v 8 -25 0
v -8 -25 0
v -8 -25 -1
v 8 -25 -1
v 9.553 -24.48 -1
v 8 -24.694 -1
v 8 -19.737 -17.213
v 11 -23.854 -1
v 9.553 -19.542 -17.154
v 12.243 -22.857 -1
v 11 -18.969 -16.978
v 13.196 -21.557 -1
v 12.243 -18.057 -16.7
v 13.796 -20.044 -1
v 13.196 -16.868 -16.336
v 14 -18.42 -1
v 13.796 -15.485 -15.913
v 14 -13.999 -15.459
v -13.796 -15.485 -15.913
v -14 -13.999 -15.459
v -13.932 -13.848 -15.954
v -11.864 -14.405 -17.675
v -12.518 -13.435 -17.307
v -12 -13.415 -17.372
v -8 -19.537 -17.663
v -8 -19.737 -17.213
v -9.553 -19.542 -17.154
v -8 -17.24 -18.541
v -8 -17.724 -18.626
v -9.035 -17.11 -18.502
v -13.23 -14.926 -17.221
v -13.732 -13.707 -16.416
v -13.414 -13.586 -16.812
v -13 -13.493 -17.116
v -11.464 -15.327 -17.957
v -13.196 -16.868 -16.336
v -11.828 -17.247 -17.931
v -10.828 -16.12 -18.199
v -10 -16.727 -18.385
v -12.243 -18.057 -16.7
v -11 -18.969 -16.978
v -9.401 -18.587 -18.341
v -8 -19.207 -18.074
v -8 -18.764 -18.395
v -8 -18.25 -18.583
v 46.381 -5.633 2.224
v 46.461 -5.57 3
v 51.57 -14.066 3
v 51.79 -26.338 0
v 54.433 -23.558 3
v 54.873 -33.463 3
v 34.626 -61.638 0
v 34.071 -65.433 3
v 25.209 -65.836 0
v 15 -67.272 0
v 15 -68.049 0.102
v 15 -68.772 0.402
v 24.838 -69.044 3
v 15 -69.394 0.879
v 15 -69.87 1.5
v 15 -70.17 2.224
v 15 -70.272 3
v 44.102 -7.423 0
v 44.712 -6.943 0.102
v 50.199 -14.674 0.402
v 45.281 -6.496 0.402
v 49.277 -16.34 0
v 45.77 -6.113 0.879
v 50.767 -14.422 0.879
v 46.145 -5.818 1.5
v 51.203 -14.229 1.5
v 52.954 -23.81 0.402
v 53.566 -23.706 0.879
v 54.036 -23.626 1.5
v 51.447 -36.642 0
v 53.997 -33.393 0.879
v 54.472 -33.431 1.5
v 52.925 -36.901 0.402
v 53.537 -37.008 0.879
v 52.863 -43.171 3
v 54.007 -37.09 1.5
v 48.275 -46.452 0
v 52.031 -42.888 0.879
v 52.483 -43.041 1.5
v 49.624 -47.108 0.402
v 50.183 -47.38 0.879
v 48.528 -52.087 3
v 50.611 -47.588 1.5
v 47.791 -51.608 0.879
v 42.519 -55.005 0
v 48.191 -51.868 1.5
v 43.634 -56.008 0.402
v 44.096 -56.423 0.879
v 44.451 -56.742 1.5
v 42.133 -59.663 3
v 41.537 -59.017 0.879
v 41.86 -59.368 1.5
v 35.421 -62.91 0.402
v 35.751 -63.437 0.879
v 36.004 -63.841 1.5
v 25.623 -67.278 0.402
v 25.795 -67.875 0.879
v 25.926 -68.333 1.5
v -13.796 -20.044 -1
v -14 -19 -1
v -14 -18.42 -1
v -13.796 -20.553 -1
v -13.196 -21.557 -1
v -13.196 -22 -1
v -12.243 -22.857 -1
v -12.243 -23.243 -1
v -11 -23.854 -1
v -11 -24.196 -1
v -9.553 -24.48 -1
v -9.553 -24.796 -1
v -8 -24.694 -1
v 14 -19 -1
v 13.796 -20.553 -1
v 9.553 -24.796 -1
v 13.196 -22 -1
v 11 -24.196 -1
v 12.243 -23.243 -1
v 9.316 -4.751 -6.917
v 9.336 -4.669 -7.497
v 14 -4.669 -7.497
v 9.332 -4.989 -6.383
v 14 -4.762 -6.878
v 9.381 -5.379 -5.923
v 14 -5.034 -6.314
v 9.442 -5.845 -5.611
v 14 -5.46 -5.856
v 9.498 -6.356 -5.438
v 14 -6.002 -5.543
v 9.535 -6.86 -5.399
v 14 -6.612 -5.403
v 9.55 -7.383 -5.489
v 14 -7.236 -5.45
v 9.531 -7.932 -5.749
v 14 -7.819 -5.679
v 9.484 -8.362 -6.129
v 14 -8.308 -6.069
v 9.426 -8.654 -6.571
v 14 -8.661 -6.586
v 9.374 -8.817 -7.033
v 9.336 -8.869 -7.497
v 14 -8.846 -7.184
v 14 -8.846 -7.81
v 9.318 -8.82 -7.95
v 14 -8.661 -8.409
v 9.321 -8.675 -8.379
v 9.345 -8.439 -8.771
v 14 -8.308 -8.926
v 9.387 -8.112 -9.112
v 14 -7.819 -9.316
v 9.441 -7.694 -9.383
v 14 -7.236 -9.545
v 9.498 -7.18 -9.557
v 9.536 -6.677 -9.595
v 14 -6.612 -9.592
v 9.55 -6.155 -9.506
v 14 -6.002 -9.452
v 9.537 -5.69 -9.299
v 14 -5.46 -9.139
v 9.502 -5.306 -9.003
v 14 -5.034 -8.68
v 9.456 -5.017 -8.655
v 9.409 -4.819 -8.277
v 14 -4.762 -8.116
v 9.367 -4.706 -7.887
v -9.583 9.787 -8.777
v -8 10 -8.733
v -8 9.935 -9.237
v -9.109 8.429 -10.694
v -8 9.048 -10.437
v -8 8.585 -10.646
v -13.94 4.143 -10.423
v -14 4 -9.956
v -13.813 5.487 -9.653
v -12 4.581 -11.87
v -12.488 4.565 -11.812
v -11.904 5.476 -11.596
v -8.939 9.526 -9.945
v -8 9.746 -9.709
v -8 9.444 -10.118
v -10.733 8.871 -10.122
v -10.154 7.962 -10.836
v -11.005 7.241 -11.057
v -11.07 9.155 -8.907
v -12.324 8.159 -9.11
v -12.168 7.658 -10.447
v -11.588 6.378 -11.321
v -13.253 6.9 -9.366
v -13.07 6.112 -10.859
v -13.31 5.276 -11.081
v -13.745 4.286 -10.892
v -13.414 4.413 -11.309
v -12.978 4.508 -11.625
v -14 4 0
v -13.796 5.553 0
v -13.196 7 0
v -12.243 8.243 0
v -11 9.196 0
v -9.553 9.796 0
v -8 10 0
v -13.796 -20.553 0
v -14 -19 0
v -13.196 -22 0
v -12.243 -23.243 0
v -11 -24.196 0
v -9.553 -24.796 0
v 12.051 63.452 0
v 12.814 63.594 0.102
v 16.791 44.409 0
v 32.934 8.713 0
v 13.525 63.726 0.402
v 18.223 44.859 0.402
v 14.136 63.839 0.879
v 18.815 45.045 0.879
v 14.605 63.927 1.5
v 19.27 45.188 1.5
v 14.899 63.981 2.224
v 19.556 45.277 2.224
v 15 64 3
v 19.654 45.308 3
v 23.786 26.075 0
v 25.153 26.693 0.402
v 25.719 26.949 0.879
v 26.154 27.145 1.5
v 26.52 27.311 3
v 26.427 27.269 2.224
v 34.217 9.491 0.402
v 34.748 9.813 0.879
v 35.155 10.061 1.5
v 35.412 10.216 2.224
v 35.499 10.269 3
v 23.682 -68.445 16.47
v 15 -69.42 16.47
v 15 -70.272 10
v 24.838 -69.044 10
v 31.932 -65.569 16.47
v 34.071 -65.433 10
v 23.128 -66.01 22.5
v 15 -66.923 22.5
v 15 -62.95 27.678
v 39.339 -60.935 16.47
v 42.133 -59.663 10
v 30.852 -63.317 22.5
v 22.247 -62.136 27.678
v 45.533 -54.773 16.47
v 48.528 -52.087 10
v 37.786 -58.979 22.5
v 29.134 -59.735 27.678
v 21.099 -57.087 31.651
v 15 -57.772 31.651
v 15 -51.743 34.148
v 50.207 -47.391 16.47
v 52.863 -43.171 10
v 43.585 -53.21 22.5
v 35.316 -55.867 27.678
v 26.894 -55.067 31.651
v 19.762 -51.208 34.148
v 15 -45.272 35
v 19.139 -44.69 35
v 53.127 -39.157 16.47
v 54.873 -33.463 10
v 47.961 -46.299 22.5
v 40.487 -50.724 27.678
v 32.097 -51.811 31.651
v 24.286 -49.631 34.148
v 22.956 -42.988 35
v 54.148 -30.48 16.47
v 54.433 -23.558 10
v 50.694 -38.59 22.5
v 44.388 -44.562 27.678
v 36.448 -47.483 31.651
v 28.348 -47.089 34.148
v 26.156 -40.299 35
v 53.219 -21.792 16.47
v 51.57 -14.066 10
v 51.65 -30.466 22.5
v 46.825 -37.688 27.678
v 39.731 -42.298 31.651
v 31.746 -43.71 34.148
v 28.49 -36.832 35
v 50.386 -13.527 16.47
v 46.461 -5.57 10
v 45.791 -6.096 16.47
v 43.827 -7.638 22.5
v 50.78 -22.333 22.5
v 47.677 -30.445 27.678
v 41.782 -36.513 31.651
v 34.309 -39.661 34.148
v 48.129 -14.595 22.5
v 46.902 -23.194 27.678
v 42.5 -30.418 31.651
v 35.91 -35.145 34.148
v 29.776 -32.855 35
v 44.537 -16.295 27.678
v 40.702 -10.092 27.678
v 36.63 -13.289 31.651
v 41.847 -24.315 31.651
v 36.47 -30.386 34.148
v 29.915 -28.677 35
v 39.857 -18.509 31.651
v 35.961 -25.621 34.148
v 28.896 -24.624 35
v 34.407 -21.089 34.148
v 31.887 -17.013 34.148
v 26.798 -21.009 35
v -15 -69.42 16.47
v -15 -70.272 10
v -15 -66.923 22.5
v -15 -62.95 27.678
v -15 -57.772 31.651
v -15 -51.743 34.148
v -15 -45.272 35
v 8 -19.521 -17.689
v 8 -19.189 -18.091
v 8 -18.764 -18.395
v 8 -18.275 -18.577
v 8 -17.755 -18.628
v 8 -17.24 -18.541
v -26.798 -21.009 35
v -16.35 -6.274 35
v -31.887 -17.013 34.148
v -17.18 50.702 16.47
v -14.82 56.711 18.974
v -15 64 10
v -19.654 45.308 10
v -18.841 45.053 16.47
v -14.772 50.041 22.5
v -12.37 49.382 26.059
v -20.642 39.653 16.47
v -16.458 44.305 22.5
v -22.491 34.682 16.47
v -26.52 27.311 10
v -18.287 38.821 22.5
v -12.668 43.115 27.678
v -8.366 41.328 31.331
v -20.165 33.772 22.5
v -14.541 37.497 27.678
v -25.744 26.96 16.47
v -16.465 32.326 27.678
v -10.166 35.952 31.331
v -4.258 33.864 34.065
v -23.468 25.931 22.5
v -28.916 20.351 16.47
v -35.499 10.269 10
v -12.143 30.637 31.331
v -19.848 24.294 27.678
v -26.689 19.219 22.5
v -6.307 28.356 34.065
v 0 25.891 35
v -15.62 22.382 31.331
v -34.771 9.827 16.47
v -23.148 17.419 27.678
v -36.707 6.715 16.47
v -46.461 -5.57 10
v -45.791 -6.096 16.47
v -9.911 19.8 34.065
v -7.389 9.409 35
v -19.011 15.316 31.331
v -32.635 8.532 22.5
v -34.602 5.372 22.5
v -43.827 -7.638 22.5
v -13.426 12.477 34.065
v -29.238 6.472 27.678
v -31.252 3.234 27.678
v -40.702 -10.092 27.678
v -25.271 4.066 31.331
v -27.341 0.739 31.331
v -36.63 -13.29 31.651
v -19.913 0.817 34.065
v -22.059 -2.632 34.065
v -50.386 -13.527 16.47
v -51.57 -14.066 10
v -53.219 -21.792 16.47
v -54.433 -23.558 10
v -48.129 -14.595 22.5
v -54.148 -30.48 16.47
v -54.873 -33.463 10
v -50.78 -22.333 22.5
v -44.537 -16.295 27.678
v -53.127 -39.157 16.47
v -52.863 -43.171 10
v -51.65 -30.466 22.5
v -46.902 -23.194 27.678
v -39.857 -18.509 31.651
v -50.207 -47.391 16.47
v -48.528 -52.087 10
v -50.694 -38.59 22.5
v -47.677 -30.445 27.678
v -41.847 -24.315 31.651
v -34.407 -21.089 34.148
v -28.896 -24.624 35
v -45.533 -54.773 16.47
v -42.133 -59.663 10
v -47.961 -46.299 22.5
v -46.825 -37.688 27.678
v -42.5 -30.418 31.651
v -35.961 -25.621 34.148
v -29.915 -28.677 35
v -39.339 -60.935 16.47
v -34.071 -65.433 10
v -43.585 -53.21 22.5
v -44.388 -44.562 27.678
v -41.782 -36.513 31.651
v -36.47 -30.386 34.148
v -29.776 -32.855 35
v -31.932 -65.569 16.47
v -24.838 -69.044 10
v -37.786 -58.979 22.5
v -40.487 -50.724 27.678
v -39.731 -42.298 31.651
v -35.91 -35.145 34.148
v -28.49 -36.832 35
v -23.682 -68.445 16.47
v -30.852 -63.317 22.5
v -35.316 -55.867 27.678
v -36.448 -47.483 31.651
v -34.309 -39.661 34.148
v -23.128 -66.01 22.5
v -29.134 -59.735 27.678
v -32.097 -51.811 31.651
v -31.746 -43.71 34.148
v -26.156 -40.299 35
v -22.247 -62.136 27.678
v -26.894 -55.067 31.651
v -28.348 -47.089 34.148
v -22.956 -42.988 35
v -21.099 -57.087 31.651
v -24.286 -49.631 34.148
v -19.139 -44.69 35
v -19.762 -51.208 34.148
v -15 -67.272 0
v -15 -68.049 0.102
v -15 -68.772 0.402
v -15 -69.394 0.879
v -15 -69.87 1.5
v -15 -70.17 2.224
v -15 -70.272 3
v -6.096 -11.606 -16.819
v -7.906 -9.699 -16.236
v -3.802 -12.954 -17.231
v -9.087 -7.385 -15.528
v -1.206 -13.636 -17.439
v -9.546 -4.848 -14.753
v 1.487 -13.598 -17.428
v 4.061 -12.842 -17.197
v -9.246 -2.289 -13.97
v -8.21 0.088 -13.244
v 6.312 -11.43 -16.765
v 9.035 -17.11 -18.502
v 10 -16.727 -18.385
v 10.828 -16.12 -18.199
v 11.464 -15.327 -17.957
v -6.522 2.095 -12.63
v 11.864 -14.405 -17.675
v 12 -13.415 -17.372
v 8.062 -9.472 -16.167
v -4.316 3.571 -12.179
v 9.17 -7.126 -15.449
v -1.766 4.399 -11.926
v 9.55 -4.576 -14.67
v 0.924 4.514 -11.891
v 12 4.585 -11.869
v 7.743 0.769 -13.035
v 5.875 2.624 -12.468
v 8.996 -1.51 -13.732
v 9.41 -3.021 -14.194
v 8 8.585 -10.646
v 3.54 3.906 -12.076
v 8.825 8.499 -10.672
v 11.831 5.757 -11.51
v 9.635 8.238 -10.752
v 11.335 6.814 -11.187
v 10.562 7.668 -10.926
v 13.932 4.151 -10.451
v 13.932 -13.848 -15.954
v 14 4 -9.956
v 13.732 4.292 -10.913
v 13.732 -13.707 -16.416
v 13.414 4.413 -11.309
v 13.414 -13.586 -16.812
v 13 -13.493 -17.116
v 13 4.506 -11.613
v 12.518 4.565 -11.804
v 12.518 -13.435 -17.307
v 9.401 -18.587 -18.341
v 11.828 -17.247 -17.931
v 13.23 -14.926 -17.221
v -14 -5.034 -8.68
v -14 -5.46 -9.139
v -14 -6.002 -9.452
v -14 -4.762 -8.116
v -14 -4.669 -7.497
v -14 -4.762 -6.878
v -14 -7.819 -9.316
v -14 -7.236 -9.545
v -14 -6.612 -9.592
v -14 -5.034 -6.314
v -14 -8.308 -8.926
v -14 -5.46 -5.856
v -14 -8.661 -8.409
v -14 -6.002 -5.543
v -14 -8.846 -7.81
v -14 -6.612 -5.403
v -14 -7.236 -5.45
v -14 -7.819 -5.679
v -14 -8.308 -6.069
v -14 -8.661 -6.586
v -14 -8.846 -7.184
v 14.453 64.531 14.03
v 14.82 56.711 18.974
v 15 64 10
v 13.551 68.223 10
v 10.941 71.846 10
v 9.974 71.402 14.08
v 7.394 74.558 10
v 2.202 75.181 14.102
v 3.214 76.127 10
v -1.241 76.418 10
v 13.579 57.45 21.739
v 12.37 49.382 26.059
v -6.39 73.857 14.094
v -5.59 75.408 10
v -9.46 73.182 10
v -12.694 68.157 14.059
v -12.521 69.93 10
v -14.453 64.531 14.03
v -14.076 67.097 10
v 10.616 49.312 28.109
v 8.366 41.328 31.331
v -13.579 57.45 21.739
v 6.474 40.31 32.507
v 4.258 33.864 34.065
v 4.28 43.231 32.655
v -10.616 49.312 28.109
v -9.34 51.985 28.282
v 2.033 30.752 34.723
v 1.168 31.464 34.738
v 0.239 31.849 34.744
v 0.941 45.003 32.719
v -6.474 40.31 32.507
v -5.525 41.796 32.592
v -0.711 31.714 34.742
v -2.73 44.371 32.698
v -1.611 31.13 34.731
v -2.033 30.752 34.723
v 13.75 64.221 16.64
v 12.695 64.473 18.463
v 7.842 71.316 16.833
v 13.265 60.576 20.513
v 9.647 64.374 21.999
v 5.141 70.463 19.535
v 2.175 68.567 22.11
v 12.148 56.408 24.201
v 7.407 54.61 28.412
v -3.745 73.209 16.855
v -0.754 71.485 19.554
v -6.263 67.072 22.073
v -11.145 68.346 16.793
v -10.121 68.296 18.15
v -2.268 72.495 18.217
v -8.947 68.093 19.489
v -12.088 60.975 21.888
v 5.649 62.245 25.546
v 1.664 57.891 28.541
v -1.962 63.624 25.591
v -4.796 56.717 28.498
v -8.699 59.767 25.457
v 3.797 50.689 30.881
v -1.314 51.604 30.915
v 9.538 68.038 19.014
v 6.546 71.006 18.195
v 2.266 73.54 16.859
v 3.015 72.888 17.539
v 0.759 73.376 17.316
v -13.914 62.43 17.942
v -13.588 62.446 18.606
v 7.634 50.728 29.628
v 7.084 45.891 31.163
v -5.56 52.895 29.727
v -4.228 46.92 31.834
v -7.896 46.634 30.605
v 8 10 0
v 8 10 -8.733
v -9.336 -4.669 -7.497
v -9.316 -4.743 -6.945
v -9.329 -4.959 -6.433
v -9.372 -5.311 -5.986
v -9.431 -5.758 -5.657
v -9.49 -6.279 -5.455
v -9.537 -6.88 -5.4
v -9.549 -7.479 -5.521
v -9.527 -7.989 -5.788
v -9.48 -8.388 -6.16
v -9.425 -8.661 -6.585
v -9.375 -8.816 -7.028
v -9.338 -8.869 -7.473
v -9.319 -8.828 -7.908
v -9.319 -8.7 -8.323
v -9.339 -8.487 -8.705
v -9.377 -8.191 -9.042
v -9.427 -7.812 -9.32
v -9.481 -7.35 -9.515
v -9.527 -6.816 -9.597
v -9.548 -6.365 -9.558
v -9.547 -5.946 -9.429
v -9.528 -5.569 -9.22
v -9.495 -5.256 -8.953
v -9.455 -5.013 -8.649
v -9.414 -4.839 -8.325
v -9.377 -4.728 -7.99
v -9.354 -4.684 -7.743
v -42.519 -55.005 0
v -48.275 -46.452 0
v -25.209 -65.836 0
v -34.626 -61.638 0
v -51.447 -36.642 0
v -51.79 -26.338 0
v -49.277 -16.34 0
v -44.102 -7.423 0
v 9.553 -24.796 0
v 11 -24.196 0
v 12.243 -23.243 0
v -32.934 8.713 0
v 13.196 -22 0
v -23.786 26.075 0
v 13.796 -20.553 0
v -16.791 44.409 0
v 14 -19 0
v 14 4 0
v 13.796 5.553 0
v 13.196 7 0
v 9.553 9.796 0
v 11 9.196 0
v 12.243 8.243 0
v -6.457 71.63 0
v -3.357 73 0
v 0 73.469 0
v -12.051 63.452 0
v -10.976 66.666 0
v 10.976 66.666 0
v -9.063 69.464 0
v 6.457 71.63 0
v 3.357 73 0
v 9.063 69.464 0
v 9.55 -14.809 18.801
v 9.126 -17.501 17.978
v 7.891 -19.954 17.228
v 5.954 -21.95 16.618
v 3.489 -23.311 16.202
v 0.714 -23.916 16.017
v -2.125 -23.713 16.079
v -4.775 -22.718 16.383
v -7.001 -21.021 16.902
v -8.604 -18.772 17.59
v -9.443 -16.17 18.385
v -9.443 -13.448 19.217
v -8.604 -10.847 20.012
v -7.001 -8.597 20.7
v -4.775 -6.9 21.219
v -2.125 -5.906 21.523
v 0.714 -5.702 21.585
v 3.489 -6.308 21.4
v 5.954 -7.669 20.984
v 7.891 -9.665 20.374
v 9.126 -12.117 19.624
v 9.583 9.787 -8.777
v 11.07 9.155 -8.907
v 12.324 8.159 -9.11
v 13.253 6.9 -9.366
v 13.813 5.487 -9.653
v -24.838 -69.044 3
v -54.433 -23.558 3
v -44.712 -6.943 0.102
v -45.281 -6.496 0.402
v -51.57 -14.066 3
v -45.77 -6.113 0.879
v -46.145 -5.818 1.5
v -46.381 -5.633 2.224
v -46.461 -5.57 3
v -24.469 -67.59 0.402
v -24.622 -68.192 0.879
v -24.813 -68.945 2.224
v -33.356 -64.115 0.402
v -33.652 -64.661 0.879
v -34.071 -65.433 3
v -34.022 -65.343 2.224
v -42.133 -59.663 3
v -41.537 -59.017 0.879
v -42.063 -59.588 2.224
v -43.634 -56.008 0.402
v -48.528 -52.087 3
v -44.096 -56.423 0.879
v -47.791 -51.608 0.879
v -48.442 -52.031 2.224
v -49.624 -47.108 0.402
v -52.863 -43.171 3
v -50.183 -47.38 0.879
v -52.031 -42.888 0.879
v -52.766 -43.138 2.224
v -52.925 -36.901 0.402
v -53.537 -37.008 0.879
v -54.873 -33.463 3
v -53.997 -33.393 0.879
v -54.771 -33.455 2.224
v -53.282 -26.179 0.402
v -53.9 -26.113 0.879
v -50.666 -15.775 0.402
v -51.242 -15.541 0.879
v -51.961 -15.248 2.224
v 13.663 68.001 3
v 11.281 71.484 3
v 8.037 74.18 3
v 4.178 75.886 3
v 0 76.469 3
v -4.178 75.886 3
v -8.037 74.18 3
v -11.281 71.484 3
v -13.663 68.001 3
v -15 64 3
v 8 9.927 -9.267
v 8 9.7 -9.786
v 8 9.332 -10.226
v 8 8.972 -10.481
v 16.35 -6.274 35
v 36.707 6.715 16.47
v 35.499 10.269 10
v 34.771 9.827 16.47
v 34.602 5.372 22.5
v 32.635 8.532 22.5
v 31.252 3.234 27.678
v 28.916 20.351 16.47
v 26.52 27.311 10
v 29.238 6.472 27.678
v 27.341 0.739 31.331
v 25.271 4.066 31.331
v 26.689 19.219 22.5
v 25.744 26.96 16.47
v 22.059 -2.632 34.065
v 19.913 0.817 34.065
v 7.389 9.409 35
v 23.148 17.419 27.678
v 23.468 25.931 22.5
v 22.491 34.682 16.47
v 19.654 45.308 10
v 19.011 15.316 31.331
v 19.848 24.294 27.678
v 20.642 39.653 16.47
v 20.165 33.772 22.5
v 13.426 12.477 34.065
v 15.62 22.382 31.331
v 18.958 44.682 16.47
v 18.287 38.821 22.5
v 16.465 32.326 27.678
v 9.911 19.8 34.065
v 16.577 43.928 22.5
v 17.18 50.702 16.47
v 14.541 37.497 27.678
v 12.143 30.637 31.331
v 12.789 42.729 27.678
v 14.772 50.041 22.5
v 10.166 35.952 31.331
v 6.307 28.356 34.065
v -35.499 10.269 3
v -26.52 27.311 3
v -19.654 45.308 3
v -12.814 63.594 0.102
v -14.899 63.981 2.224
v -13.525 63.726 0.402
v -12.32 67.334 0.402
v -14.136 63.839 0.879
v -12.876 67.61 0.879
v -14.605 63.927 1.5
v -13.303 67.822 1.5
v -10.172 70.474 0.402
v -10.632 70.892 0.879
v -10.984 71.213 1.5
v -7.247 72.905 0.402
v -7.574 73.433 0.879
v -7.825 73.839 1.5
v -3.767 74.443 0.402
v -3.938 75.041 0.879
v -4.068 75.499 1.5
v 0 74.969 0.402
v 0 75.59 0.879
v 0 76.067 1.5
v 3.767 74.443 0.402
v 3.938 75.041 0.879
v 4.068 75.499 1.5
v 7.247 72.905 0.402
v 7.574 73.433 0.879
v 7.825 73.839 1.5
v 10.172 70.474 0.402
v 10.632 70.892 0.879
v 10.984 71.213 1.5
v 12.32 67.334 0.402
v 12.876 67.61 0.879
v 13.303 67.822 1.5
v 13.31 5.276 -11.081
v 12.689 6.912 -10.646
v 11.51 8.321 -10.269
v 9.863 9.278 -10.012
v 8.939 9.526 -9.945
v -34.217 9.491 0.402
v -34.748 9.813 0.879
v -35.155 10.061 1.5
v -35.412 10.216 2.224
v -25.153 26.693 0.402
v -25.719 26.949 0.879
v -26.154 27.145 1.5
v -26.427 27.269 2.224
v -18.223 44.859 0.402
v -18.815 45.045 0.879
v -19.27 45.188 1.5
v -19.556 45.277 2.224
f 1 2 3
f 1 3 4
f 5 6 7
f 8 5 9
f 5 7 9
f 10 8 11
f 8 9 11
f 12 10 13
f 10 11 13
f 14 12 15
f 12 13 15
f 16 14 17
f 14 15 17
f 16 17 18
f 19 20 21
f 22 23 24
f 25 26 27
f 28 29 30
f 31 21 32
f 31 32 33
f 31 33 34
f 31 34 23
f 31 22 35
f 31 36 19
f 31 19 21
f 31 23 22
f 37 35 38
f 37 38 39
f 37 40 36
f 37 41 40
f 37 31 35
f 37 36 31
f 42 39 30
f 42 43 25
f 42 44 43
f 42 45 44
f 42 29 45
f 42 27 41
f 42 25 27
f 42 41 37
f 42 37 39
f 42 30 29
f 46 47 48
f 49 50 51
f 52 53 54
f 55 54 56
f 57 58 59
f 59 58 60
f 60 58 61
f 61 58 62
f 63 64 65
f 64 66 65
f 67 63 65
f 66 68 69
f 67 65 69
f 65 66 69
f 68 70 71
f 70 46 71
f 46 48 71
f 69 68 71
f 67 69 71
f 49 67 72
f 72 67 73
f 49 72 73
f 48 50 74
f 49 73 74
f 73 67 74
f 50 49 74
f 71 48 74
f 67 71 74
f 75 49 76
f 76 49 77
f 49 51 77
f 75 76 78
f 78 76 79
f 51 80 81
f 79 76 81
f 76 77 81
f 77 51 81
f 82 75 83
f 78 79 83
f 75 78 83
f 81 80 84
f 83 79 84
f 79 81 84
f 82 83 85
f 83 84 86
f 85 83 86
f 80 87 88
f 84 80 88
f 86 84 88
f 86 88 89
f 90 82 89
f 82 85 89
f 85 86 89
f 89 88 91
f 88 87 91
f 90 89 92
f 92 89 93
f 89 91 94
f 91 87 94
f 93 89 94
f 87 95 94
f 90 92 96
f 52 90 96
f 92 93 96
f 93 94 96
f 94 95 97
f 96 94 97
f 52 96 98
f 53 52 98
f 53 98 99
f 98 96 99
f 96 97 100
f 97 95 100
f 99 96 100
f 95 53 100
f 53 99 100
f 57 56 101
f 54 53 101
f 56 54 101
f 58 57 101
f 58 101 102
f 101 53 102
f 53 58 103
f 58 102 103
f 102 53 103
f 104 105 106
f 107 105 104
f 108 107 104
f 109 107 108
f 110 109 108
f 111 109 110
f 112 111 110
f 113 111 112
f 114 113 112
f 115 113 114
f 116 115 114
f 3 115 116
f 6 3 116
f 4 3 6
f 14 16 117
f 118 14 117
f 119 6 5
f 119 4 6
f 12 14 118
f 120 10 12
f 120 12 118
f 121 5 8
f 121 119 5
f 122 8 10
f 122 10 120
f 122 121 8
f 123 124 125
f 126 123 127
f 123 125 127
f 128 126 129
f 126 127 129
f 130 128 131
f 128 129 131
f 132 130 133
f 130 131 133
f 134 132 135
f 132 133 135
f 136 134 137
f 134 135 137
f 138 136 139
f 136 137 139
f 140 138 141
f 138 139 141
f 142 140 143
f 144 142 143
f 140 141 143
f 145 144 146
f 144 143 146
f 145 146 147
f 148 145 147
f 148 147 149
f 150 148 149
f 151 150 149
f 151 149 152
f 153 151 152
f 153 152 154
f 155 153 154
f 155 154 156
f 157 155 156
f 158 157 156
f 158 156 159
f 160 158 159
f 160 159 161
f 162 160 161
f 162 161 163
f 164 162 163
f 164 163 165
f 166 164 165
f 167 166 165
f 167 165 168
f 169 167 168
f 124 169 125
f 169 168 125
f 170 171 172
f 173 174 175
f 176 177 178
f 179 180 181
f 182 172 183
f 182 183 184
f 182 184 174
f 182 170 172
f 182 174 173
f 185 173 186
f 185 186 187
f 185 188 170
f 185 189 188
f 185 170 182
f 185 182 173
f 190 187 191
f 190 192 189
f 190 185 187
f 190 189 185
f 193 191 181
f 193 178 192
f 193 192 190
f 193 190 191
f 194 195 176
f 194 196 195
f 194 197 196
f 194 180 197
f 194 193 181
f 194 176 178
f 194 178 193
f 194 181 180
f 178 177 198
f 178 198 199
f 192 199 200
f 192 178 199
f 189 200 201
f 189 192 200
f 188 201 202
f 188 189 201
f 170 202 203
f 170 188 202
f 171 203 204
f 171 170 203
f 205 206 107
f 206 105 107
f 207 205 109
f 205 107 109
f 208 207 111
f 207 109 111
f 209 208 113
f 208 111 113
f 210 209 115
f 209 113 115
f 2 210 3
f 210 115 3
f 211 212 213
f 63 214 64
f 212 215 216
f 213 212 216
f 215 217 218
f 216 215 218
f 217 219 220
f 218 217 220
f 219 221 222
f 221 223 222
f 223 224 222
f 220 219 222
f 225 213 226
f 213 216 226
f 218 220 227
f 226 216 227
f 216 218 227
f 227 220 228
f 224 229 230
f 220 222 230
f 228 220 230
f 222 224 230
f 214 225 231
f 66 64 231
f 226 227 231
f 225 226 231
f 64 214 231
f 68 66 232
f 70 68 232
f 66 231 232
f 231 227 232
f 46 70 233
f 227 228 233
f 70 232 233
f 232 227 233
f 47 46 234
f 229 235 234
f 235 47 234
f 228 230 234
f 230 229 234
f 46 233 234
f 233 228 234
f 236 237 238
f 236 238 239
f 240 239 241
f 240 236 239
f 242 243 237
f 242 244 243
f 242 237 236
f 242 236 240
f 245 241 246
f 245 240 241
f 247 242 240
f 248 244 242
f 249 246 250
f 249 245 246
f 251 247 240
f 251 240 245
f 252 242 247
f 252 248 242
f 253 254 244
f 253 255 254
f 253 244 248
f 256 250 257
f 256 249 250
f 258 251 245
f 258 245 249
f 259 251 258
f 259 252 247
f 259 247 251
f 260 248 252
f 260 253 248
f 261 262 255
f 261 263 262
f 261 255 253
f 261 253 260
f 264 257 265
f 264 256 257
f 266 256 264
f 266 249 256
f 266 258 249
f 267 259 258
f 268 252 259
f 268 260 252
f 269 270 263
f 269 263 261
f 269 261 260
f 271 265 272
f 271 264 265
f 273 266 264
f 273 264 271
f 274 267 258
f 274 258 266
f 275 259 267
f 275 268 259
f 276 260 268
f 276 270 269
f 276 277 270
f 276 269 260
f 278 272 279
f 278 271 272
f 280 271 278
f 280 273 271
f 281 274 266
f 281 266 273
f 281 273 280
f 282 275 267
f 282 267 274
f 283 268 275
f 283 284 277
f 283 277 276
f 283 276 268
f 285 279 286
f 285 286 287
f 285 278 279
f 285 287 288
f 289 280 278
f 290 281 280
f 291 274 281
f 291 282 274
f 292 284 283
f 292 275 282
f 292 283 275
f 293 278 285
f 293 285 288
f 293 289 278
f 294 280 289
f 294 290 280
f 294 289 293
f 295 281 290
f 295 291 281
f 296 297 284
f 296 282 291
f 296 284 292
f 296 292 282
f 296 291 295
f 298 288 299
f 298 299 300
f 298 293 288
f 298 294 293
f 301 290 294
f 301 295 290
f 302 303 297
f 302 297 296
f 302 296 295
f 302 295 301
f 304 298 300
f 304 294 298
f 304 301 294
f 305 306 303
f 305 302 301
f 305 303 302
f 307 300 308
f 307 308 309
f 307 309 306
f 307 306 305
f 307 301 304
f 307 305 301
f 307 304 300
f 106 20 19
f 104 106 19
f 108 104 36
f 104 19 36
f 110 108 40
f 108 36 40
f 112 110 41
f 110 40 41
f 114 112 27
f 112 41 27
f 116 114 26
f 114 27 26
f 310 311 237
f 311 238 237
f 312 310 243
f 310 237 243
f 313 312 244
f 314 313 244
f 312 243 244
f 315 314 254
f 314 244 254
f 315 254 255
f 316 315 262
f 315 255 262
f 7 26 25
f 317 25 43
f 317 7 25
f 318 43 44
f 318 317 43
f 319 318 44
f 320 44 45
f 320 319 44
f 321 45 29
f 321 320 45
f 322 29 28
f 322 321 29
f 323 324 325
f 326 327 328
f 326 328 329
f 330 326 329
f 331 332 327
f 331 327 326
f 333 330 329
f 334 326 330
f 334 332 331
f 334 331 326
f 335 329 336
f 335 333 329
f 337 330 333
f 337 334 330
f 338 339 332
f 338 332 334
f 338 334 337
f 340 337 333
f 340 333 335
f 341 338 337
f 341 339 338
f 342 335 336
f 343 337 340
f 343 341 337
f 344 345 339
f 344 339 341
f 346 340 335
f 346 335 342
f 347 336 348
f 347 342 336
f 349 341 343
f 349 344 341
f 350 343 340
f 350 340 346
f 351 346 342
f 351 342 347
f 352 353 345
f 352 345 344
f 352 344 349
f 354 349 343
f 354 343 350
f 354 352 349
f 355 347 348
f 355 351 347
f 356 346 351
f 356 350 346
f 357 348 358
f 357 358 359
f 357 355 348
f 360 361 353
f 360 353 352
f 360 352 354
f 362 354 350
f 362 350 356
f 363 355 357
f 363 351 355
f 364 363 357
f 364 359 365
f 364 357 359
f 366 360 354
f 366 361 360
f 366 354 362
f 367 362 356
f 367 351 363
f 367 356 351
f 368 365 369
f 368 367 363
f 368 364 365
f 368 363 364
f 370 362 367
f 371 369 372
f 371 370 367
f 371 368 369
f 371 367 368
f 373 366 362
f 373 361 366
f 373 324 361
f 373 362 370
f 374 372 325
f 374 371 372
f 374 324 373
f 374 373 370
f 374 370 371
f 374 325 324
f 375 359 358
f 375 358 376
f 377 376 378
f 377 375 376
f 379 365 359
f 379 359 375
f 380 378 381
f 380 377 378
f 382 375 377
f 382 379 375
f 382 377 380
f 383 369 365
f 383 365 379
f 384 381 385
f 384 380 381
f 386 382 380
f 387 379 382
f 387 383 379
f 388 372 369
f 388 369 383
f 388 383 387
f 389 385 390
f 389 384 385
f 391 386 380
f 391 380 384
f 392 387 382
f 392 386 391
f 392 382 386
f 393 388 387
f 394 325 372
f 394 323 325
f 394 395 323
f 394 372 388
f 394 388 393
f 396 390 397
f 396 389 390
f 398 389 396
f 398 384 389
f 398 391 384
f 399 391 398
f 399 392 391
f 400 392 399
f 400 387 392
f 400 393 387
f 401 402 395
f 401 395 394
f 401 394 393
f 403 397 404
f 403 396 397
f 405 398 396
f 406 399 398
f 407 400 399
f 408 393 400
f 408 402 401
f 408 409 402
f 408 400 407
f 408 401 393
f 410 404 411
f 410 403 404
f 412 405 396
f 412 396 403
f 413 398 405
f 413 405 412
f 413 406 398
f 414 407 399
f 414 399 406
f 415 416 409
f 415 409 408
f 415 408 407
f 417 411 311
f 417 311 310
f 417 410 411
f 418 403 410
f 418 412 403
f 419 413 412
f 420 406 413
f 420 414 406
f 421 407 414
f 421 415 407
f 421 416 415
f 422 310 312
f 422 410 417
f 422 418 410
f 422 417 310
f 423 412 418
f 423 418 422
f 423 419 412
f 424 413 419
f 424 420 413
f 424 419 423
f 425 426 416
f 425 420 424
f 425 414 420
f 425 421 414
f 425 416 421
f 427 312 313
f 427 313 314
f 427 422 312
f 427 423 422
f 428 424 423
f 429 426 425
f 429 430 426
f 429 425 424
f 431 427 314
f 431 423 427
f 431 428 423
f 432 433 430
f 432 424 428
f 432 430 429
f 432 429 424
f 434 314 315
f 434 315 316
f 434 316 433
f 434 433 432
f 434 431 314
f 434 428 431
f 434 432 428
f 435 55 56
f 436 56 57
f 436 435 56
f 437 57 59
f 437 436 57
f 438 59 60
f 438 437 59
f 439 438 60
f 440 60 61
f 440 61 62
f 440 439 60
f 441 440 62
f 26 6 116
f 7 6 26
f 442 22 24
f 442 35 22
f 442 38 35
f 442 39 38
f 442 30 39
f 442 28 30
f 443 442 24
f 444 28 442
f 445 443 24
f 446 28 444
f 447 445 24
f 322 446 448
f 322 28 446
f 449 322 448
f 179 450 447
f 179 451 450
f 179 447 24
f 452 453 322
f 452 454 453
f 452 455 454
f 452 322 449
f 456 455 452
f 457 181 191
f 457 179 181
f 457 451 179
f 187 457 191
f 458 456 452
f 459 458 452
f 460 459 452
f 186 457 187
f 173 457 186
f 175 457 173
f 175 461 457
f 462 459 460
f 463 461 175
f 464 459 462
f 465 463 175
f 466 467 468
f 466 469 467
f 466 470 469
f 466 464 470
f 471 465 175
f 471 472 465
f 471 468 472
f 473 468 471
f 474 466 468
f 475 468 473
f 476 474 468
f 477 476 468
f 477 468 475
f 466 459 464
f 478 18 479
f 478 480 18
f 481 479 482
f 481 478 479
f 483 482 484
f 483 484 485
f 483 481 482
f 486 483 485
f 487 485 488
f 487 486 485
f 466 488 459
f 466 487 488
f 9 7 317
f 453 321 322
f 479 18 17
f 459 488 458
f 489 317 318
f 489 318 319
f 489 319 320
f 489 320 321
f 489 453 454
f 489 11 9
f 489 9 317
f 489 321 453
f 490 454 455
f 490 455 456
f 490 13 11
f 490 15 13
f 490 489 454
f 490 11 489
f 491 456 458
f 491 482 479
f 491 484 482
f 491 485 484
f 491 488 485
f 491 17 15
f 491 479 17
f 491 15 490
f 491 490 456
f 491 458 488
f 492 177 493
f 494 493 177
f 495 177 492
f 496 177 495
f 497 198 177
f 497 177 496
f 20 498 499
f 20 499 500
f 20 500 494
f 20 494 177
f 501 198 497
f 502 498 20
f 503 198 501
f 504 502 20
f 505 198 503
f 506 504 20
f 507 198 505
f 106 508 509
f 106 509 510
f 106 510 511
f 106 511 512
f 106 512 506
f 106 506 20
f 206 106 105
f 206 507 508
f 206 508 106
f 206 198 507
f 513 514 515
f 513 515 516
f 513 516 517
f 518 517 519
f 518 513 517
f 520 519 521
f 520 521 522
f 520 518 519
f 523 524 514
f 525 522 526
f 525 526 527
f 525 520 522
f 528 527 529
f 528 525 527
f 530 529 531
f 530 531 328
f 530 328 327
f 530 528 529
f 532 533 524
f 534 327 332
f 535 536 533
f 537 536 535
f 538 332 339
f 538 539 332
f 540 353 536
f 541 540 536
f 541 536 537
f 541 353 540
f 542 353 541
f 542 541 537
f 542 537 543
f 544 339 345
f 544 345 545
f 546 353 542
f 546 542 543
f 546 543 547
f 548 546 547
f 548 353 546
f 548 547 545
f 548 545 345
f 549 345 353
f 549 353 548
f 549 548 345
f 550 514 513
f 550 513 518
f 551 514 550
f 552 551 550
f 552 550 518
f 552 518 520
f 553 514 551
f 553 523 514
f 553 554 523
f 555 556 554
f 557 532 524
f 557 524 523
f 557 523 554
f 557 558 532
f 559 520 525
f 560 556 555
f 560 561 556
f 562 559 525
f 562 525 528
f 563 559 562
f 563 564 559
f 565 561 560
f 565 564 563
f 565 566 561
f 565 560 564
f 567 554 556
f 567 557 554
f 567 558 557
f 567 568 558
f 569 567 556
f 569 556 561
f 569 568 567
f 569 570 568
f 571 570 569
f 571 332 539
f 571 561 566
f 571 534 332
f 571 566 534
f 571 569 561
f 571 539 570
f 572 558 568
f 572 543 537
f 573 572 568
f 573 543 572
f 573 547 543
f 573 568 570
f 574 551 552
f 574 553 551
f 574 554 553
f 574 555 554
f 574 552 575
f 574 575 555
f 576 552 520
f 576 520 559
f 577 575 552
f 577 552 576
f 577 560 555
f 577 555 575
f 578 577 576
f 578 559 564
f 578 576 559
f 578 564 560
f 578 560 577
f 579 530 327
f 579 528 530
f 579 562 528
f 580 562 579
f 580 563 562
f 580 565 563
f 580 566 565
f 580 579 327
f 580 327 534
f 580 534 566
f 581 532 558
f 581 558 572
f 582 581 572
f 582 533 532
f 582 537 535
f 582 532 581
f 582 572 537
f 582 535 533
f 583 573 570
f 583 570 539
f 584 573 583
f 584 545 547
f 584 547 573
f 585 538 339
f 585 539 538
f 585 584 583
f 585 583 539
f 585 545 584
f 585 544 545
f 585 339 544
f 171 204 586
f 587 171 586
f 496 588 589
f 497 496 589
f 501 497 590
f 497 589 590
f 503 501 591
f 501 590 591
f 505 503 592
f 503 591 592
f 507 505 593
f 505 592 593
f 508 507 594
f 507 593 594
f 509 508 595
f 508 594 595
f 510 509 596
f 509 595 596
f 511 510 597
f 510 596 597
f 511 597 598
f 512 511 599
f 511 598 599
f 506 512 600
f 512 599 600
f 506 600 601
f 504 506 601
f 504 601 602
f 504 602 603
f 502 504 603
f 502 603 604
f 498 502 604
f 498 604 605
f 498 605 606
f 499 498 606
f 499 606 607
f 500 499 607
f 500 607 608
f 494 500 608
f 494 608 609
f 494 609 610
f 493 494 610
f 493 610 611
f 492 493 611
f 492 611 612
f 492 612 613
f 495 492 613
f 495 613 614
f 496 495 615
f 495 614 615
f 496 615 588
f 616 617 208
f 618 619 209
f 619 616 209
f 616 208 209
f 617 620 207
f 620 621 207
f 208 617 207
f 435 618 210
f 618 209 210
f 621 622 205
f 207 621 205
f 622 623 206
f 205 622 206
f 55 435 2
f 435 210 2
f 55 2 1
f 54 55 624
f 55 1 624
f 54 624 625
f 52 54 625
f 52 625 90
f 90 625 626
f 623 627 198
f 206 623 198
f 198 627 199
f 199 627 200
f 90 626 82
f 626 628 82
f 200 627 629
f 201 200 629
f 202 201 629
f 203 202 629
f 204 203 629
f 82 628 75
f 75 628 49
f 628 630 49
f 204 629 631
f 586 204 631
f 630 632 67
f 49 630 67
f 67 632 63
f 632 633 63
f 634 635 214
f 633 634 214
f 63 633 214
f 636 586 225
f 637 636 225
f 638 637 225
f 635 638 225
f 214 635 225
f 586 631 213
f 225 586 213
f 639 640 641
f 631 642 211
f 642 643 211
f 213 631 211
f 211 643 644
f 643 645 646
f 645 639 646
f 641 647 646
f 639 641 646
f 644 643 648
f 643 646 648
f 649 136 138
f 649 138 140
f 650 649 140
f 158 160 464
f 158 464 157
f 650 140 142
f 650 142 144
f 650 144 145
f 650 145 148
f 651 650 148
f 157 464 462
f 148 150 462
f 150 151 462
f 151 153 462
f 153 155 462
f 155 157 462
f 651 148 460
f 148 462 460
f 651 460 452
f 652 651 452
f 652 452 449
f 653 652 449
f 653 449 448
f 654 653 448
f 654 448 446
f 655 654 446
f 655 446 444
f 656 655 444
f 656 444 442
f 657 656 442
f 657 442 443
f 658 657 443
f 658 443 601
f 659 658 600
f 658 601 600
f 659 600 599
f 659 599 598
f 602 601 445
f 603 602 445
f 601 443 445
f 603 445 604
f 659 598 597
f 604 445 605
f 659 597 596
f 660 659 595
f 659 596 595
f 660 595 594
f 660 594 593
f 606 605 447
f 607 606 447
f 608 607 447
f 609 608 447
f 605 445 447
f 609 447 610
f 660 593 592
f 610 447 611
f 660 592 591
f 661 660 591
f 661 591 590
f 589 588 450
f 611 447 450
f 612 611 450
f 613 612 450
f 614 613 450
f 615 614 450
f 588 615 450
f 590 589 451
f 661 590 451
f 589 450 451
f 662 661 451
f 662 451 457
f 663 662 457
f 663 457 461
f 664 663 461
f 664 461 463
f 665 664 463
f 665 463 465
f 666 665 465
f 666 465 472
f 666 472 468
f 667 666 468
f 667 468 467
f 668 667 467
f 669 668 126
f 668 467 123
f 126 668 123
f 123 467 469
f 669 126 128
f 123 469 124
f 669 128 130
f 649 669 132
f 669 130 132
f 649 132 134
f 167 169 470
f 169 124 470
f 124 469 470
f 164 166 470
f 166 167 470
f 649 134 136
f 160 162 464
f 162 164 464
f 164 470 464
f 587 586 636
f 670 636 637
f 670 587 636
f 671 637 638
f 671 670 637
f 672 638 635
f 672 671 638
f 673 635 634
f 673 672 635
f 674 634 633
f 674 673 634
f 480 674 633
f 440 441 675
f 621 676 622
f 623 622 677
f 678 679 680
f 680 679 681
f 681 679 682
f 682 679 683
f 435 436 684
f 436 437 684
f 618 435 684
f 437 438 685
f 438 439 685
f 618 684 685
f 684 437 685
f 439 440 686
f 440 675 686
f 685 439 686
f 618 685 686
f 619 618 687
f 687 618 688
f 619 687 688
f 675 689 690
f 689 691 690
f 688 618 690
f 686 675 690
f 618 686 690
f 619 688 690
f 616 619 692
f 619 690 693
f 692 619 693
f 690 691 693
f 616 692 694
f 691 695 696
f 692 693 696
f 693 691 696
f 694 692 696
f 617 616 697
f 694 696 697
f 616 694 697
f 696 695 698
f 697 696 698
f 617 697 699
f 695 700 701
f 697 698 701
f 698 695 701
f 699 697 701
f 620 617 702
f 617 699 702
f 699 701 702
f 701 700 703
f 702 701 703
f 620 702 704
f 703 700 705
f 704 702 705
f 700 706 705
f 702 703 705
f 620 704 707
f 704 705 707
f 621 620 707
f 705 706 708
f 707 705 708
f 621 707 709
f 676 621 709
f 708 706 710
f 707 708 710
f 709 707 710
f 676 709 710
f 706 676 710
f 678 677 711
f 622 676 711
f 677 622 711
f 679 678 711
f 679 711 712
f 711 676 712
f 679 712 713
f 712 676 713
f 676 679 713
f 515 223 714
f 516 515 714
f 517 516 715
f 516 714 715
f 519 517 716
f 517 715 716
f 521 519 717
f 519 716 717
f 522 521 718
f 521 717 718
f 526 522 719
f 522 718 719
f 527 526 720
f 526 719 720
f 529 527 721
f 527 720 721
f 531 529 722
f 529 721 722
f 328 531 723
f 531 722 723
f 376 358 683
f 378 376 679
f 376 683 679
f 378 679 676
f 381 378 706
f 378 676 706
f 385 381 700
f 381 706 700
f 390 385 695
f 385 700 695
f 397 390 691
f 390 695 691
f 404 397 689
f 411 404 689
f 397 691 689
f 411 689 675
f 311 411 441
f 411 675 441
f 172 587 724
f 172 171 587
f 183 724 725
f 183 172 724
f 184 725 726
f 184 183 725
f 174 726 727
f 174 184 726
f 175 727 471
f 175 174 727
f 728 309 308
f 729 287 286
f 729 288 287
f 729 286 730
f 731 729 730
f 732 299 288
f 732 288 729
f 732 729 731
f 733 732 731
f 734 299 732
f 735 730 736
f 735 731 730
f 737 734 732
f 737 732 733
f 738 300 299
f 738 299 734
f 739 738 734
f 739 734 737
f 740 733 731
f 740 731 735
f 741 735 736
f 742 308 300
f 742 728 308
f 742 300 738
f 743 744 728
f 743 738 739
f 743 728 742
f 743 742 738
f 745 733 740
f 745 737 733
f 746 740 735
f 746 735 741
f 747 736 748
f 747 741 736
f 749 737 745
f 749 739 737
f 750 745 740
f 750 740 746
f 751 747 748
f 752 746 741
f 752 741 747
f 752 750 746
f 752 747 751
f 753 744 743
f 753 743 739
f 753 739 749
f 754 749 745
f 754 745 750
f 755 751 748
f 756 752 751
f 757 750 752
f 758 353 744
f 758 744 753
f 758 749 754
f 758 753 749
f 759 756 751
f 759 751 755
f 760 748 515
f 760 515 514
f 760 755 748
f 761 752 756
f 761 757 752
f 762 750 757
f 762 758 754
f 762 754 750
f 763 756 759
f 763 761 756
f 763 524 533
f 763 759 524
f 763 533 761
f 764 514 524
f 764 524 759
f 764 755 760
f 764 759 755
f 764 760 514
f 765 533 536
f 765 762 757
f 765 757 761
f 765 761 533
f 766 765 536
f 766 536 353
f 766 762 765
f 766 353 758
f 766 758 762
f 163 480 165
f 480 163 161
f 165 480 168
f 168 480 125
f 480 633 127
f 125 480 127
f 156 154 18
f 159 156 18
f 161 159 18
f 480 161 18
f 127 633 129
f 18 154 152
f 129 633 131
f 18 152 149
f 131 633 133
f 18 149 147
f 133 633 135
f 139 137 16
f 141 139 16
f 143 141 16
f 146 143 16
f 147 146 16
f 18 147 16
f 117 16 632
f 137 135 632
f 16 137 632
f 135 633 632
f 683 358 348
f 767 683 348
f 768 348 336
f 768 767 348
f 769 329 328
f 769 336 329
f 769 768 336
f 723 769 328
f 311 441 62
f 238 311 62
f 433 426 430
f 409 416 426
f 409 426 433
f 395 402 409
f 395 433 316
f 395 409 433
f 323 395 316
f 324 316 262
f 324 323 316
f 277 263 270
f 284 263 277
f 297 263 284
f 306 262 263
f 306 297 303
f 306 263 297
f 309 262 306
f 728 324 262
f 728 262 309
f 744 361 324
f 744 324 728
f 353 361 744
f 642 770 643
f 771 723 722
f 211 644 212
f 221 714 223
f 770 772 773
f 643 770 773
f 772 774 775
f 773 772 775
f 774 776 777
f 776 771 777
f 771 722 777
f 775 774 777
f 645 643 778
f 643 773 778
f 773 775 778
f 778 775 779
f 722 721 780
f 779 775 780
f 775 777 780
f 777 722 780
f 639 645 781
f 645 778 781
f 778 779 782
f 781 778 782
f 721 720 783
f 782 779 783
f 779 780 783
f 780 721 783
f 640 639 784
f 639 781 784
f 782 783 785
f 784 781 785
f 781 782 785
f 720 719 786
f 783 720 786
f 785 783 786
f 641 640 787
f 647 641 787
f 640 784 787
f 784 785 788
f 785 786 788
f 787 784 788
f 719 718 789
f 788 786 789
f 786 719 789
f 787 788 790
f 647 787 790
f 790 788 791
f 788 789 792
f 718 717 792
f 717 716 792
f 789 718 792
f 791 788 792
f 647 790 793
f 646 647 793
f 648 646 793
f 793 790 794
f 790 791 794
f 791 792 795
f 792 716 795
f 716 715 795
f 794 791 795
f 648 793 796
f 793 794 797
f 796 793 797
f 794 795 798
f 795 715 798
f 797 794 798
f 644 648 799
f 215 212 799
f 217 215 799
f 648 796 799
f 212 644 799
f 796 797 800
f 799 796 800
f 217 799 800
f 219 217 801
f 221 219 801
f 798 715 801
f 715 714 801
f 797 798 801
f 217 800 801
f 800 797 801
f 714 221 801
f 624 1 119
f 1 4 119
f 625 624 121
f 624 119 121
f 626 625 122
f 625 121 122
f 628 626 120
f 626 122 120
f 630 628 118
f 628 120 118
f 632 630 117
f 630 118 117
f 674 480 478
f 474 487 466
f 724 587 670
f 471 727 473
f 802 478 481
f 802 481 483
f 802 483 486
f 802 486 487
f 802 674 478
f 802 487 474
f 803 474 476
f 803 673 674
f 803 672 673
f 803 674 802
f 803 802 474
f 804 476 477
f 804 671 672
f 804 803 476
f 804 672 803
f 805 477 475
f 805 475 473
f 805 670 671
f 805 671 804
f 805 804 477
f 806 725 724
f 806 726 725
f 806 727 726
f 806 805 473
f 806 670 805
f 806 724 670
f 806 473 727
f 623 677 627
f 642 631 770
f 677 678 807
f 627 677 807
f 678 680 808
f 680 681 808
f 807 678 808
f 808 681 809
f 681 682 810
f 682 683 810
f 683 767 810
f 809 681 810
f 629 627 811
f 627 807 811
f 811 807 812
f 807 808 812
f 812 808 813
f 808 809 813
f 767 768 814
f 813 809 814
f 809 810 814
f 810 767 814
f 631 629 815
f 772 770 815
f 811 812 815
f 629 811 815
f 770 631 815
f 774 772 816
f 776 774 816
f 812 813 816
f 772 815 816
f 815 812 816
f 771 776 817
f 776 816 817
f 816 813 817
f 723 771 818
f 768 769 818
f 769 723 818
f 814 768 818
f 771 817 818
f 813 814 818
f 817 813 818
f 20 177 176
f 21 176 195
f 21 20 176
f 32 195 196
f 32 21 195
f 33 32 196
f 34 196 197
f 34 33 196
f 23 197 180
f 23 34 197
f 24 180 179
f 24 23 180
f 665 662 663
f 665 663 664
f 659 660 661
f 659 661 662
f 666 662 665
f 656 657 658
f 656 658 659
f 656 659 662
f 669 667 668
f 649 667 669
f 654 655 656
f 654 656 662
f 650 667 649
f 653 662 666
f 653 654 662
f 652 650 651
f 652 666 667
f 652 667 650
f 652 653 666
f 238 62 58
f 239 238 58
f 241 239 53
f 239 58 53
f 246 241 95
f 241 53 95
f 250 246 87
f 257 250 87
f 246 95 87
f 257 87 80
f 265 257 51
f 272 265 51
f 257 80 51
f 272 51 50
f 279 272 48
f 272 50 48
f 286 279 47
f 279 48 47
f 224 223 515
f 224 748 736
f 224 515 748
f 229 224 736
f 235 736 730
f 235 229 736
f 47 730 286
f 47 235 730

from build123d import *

# Parameters (mm, degrees)
PAD_DEPTH       = 35
FILLET_R        = 25
SKETCH001_W     = 28
SKETCH001_H     = 35
PAD001_DEPTH    = 1
PAD002_DEPTH    = 28
SKETCH004_R     = 9.55
POCKET_DEPTH    = 35
SKETCH005_R     = 2.1
POCKET001_DEPTH = 69.001
FILLET001_R     = 6
FILLET002_R     = 2
FILLET003_R     = 3
FILLET004_R     = 6


with BuildPart() as part:
    # Sketch → Pad (new body)
    with BuildSketch(Plane.XY):
        with BuildLine():
            ThreePointArc((15, 64), (0, 76.46889), (-15, 64))
            ThreePointArc((-46.461169, -5.570082), (-26.519858, 27.310773), (-15, 64))
            ThreePointArc((-46.461169, -5.570082), (-50.972801, -47.763847), (-15, -70.272205))
            Line((-15, -70.272205), (15, -70.272205))
            ThreePointArc((15, -70.272205), (50.972801, -47.763847), (46.461169, -5.570082))
            ThreePointArc((15, 64), (26.519858, 27.310773), (46.461169, -5.570082))
        make_face()
    extrude(amount=PAD_DEPTH)

    # Fillet
    fillet_edges = [part.edges().sort_by_distance(p)[0] for p in [
        (0, 76.46889, 35),
    ]]
    fillet(fillet_edges, radius=FILLET_R)

    # Sketch001 → Pad001 (new body)
    with BuildSketch(Plane(origin=(0, 0, 0), x_dir=(1, 0, 0), z_dir=(0, 0, -1))):
        with Locations((0, 7.5)):
            Rectangle(SKETCH001_W, SKETCH001_H)
    extrude(amount=PAD001_DEPTH)

    # Sketch002 → Pad002 (new body)
    with BuildSketch(Plane.YZ.offset(14)):
        Polygon((-25, 0), (-19.152566, -19.126095), (10, -10.213261), (10, 0), align=None)
    extrude(amount=-PAD002_DEPTH)

    # Sketch004 → Pocket (cut)
    with BuildSketch(Plane(origin=(0, 3.710404, -12.136184), x_dir=(1, 0, 0), z_dir=(0, 0.292372, -0.956305))):
        with Locations((0, 8.66532)):
            Circle(SKETCH004_R)
    extrude(amount=-POCKET_DEPTH, mode=Mode.SUBTRACT)

    # Sketch005 → Pocket001 (cut, through all)
    with BuildSketch(Plane.YZ.offset(14)):
        with Locations((-6.769071, -7.497393)):
            Circle(SKETCH005_R)
    extrude(amount=-POCKET001_DEPTH, mode=Mode.SUBTRACT)

    # Fillet001
    fillet001_edges = [part.edges().sort_by_distance(p)[0] for p in [
        (14, 10, -5.606631),
        (-14, 10, -5.606631),
        (-14, -21.923418, -10.063048),
        (14, -21.923418, -10.063048),
    ]]
    fillet(fillet001_edges, radius=FILLET001_R)

    # Fillet002
    fillet002_edges = [part.edges().sort_by_distance(p)[0] for p in [
        (14, -4.707369, -14.709755),
    ]]
    fillet(fillet002_edges, radius=FILLET002_R)

    # Fillet003
    fillet003_edges = [part.edges().sort_by_distance(p)[0] for p in [
        (26.519858, 27.310773, 0),
    ]]
    fillet(fillet003_edges, radius=FILLET003_R)

    # Fillet004
    fillet004_edges = [part.edges().sort_by_distance(p)[0] for p in [
        (-14, -25, -0.5),
        (14, -25, -0.5),
    ]]
    fillet(fillet004_edges, radius=FILLET004_R)


solid = part.part
